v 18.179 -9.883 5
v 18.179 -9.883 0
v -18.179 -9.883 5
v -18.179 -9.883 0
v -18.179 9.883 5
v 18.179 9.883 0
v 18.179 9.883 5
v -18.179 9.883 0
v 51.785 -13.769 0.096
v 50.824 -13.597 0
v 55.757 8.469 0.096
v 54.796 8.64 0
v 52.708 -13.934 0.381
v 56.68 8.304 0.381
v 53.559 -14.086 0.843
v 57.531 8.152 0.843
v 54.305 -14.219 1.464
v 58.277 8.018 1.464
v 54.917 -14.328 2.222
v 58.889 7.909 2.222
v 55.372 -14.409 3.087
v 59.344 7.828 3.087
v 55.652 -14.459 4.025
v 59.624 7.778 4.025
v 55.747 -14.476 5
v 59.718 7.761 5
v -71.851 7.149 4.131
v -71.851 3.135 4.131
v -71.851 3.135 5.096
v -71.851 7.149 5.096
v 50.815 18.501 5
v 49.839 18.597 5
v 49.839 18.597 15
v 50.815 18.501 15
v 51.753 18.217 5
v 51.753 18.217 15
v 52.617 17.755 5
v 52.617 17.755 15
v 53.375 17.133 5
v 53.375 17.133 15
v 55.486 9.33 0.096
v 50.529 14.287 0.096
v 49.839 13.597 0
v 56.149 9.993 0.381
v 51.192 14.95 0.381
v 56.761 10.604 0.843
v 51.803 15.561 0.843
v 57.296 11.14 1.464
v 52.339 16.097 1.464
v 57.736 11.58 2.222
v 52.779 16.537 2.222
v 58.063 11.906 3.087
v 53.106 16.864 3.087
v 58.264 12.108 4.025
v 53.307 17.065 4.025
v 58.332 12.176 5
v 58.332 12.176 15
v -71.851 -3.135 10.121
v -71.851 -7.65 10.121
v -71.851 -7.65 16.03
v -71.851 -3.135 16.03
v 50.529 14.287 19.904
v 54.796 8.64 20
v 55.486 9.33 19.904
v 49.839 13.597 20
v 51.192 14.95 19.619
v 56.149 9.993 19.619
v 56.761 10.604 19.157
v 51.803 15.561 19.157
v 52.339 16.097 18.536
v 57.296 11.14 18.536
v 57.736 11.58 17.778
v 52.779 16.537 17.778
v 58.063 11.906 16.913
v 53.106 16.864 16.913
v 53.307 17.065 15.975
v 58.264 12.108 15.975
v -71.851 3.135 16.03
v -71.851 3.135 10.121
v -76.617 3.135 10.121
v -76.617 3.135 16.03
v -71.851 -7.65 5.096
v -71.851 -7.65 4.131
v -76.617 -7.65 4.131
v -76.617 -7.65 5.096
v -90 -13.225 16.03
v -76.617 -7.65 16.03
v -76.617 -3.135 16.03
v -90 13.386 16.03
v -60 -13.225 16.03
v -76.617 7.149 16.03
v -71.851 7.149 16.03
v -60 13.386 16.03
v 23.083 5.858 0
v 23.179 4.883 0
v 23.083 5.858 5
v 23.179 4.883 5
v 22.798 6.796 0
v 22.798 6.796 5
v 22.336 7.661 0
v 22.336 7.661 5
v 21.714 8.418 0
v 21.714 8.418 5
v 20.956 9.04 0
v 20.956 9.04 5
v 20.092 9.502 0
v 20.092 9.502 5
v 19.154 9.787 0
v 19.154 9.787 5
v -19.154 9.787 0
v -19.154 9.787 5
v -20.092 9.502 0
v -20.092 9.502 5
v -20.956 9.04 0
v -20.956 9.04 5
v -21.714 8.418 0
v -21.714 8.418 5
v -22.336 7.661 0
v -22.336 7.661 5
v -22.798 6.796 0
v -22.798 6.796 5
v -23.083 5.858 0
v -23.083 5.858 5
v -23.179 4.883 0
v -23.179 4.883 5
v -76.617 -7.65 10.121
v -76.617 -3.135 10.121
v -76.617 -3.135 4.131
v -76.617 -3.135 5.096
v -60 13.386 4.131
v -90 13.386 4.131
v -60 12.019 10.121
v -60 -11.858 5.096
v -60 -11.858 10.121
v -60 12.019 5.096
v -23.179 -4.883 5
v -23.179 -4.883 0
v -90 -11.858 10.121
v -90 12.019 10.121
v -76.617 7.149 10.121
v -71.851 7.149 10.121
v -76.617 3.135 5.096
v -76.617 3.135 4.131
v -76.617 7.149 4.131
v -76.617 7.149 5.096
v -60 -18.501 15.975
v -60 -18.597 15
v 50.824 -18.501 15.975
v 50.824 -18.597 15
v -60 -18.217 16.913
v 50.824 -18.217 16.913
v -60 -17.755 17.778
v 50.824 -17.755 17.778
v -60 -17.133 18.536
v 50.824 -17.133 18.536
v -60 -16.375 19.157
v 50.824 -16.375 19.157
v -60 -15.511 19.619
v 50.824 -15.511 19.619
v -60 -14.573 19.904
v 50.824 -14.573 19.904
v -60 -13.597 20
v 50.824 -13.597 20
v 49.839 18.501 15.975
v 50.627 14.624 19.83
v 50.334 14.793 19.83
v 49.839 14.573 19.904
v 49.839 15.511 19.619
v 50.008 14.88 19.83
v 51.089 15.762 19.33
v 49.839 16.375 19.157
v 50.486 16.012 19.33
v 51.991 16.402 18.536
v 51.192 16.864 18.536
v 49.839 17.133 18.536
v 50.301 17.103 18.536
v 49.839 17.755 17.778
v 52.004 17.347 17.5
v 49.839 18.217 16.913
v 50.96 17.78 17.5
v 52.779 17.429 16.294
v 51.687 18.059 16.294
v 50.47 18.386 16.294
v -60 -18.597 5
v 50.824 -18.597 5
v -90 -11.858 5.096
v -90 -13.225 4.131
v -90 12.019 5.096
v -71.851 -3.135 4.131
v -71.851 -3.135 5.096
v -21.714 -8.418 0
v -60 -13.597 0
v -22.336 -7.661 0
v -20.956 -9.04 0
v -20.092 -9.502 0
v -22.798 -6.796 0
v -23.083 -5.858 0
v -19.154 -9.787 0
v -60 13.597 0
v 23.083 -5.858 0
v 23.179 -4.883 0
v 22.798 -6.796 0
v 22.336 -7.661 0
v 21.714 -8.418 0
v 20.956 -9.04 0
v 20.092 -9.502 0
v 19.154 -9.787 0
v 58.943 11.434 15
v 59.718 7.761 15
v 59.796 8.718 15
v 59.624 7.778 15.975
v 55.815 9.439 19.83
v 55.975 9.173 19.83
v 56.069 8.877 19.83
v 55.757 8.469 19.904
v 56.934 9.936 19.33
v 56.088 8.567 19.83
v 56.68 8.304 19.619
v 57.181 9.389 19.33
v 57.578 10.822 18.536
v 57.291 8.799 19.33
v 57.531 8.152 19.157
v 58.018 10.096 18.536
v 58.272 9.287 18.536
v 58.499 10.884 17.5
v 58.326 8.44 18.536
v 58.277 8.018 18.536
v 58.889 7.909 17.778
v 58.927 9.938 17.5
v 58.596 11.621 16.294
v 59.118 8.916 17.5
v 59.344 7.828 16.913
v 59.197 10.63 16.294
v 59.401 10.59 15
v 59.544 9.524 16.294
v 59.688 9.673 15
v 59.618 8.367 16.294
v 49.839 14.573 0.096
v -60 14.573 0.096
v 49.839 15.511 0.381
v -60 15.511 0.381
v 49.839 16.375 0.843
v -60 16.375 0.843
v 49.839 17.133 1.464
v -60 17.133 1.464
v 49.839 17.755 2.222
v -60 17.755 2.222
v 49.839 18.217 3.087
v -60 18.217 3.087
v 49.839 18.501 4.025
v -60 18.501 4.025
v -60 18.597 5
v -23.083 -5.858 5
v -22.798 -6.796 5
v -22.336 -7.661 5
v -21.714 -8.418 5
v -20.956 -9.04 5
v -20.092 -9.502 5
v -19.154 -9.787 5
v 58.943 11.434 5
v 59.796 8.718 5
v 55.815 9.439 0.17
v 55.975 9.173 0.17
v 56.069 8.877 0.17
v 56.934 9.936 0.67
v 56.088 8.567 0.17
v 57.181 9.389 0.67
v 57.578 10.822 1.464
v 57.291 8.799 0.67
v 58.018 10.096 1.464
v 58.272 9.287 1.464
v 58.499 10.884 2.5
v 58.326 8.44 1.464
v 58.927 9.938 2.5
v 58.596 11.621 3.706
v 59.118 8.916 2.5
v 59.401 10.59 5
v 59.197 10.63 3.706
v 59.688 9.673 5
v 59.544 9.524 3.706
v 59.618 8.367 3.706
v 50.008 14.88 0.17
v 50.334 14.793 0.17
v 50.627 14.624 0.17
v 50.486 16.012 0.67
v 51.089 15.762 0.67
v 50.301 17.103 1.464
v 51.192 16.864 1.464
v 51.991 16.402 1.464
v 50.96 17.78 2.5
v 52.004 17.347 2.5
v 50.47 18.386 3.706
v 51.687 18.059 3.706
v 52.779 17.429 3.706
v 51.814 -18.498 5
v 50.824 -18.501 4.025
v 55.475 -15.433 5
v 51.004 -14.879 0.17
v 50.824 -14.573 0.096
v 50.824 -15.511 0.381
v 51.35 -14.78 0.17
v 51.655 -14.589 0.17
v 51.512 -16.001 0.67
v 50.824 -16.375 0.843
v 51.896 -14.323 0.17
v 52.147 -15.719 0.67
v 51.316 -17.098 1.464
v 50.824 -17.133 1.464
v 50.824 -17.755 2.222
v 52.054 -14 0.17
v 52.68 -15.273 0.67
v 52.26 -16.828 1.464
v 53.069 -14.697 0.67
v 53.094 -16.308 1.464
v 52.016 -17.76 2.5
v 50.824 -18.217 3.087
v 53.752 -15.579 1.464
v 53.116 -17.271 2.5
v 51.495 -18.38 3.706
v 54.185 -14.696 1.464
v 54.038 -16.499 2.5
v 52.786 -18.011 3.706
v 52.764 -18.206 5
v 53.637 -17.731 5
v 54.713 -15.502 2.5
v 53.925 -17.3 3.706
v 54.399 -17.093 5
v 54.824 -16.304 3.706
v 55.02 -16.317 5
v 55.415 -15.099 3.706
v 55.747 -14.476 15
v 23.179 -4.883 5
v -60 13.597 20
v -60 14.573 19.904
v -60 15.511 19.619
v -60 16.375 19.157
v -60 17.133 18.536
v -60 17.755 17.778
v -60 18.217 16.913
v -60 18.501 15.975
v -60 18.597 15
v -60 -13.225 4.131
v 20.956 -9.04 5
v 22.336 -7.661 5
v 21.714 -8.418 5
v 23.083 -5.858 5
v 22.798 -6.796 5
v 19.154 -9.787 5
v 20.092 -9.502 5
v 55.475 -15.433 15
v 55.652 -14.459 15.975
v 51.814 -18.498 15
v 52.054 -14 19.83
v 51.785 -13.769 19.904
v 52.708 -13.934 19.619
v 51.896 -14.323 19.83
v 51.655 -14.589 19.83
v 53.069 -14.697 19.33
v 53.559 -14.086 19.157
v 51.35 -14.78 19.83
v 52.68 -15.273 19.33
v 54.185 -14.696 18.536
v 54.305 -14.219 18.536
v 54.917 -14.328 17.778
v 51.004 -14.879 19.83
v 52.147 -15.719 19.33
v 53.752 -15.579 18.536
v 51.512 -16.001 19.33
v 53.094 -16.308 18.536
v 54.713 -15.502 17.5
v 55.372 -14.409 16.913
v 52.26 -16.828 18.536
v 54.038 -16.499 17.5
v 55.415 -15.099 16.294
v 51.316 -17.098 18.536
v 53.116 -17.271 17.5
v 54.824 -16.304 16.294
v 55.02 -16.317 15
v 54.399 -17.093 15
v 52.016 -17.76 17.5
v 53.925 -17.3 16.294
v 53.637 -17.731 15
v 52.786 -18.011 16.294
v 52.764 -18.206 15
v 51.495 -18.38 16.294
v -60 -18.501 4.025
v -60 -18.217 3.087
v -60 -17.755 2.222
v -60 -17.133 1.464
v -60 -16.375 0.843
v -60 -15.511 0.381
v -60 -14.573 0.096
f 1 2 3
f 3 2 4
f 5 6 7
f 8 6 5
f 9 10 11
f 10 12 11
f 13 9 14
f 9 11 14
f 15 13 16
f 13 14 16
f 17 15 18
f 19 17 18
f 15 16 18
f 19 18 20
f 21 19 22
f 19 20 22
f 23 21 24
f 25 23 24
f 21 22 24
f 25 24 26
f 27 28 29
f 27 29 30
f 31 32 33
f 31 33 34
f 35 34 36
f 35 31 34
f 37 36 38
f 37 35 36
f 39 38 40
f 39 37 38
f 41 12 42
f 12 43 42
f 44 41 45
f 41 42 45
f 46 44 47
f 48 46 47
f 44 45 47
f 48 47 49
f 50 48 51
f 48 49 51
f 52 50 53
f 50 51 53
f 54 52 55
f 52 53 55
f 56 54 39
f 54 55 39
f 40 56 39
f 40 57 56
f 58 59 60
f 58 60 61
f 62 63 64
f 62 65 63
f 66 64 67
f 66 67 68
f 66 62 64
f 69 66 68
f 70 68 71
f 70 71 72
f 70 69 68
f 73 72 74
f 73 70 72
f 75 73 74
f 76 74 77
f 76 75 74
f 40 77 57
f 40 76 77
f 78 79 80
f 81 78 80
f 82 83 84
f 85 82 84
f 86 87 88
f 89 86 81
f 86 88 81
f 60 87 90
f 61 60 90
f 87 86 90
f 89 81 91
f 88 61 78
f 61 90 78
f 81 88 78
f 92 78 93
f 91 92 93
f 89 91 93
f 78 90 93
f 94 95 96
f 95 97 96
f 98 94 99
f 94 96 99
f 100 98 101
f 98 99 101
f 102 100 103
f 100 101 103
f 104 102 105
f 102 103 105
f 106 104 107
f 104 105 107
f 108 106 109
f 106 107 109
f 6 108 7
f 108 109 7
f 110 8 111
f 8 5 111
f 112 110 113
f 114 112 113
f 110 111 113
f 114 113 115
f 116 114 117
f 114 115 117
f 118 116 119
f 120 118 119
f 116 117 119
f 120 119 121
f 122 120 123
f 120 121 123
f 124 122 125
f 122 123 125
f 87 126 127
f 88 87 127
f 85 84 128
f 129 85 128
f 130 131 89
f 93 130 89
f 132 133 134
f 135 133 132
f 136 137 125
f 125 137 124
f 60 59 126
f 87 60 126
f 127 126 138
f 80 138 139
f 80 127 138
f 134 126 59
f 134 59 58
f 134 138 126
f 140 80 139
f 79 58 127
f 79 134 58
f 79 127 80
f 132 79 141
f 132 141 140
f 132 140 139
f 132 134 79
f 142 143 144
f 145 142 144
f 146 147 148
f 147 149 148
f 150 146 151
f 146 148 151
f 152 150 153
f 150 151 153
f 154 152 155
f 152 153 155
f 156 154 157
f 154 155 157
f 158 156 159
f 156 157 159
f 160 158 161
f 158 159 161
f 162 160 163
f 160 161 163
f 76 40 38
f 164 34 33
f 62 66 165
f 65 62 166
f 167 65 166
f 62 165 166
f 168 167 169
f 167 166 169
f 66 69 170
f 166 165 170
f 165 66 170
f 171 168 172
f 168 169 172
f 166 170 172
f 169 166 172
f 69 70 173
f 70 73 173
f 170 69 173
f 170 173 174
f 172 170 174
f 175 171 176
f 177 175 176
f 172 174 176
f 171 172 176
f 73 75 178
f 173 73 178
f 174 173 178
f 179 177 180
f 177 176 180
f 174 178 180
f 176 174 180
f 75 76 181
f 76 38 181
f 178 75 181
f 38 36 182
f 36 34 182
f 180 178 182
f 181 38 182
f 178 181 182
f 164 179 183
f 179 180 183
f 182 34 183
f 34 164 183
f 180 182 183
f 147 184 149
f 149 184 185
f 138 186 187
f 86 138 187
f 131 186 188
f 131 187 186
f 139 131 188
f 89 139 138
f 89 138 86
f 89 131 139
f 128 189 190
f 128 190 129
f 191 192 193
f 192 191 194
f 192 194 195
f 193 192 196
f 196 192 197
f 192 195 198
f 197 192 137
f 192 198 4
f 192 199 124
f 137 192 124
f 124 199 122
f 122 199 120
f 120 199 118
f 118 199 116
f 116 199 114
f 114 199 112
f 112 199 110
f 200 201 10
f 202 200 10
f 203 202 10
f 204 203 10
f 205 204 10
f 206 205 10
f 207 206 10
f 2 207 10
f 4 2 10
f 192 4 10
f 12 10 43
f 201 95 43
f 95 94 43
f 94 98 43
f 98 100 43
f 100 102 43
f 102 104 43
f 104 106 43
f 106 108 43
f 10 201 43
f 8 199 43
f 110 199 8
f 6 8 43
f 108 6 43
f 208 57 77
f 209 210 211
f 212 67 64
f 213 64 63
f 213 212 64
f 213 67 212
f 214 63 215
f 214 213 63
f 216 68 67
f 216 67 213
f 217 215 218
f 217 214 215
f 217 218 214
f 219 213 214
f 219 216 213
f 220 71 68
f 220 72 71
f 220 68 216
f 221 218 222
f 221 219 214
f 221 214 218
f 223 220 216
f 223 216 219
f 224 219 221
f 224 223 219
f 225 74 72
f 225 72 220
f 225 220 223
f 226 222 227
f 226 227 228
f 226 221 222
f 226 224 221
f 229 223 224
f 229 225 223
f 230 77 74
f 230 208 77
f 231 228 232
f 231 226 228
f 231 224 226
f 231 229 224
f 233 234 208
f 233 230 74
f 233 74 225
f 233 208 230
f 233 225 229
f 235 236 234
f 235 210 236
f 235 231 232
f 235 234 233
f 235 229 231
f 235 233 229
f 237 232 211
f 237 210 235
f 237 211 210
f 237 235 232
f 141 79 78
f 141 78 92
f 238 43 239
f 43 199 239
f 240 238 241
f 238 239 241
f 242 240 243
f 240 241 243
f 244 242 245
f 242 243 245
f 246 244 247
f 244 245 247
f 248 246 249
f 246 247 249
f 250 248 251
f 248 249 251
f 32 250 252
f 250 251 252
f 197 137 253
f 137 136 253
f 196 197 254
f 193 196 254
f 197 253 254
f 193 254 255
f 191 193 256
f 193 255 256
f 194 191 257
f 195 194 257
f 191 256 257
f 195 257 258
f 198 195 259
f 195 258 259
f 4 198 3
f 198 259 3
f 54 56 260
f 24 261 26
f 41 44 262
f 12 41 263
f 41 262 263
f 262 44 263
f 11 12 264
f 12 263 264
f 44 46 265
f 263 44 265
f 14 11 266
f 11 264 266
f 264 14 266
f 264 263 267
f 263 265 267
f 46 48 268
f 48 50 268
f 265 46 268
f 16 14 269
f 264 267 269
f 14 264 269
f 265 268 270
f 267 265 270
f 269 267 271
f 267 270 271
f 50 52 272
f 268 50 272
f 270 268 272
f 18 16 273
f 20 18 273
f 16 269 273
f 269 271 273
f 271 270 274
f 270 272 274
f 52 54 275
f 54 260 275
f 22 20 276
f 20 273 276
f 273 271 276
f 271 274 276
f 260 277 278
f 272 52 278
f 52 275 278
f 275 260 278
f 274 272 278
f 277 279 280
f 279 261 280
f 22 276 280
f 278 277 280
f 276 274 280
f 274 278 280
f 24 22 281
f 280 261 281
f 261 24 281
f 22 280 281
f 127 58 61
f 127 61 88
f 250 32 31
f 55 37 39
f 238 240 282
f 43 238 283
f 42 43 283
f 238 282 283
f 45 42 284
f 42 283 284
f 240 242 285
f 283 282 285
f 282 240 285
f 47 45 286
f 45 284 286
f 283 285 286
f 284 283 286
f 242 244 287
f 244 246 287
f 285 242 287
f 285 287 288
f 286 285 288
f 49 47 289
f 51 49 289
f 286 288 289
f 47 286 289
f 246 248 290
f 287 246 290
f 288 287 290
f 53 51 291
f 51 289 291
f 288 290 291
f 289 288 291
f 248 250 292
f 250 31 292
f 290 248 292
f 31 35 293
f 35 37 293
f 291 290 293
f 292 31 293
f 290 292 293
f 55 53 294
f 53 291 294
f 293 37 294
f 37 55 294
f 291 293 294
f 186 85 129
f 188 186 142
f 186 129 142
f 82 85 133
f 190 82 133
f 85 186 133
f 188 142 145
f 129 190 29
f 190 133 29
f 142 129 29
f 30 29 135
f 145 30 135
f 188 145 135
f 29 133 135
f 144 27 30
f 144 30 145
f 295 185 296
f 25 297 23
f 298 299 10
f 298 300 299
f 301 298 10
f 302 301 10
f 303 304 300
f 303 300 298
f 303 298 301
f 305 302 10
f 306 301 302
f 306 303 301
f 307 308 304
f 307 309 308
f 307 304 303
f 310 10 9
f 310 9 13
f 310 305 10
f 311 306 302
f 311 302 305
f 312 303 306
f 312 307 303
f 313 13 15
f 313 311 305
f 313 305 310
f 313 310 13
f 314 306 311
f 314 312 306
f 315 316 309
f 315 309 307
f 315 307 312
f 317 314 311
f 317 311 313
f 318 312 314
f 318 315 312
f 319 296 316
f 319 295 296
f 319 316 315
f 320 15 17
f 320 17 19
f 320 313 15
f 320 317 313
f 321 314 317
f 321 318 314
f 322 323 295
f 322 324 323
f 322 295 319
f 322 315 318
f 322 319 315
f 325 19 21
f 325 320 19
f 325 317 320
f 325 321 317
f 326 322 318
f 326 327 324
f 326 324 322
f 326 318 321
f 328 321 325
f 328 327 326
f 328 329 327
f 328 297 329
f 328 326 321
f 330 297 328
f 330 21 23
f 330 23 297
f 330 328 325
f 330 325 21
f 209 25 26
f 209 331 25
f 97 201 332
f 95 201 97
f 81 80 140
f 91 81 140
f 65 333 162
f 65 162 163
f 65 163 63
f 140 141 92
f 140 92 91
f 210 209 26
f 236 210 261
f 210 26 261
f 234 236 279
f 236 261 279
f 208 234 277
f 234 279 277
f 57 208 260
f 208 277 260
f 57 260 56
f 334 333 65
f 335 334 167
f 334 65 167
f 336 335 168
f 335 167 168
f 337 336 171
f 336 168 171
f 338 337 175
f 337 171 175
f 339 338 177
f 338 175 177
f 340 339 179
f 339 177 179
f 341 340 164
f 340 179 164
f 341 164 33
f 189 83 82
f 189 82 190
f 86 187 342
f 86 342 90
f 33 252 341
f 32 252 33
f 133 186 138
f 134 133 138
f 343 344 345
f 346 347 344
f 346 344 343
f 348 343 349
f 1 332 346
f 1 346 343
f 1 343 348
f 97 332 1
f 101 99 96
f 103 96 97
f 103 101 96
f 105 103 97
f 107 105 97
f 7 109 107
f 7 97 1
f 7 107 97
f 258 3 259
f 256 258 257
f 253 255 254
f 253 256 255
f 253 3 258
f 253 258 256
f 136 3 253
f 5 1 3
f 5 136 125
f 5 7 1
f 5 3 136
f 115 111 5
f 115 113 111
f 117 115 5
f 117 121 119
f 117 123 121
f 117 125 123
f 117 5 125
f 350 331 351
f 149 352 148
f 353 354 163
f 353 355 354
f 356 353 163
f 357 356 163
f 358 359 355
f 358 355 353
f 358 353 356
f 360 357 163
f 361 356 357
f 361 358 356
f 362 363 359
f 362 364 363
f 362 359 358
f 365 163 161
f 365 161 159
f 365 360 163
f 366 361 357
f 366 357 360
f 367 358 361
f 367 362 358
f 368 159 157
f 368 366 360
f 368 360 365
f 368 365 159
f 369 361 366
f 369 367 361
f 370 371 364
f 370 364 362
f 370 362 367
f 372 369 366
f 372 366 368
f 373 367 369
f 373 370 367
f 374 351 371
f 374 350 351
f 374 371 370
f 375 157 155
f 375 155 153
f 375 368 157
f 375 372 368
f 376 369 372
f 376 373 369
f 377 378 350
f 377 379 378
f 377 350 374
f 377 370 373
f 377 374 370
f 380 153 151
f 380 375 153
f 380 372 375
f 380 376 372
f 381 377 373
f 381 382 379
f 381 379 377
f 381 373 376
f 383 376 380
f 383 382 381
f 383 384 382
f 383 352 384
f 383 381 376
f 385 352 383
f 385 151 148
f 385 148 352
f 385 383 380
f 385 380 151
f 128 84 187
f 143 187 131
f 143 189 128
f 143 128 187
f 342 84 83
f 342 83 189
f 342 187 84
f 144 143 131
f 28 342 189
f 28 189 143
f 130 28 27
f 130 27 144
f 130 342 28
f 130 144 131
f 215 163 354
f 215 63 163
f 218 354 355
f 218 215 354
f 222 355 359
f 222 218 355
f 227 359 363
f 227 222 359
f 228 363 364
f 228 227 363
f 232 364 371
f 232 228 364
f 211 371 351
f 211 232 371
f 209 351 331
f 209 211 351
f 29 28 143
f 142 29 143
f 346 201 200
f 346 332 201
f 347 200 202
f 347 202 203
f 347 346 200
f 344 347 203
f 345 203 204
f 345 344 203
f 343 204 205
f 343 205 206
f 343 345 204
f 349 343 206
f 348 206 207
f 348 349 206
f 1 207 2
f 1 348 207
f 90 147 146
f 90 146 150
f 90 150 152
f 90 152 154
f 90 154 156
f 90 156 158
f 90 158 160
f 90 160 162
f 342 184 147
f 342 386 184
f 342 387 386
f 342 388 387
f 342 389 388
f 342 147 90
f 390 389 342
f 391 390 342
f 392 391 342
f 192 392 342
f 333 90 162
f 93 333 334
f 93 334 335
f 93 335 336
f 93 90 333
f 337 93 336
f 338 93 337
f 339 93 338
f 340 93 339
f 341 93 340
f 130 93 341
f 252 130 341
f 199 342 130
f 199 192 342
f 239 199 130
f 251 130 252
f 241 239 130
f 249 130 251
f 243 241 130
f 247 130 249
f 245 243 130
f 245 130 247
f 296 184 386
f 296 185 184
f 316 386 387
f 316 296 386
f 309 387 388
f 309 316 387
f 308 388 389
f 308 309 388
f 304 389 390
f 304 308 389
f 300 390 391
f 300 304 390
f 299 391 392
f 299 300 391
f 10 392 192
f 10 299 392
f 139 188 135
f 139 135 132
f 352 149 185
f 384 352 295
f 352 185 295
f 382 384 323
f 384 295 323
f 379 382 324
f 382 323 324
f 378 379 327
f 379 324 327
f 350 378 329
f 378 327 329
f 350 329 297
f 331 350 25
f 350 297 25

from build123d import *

# Parameters (mm, degrees)
SKETCH1_W           = 120
SKETCH1_H           = 37.194444444
BOSS_EXTRUDE4_DEPTH = 20
CUT_EXTRUDE15_DEPTH = 23
SKETCH10_W          = 11.898671916
SKETCH10_H          = 26.611218947
SKETCH10_W_2        = 10.049553983
SKETCH10_H_2        = 23.877740264
BOSS_EXTRUDE5_DEPTH = 30
SKETCH11_W          = 5.024776991
SKETCH11_H          = 23.877740264
BOSS_EXTRUDE6_DEPTH = 30
SKETCH12_W          = 4.765877192
SKETCH12_H          = 4.013370267
SKETCH12_H_2        = 4.515041551
CUT_EXTRUDE16_DEPTH = 16.868939526
FILLET2_R           = 5
SKETCH16_W          = 46.35727902
SKETCH16_H          = 19.765742142
CUT_EXTRUDE17_DEPTH = 5
FILLET3_R           = 5


with BuildPart() as part:
    # Sketch1 → Boss-Extrude4 (new body)
    with BuildSketch(Plane.XY):
        Polygon((36.833333333, 25.458333333), (36.833333333, 18.597222222), (60, 18.597222222), (60, -18.597222222), (68.25, -18.597222222), (72.583333333, 25.458333333), align=None)
        Rectangle(SKETCH1_W, SKETCH1_H)
    extrude(amount=BOSS_EXTRUDE4_DEPTH)

    # Sketch6 → Cut-Extrude15 (cut)
    with BuildSketch(Plane.XY.offset(20)):
        Polygon((51.910176302, 18.597222222), (36.833333333, 18.597222222), (36.833333333, 25.458333333), (72.583333333, 25.458333333), (68.25, -18.597222222), (55.010463364, -18.597222222), (60.177305366, 10.330093158), align=None)
    extrude(amount=-CUT_EXTRUDE15_DEPTH, mode=Mode.SUBTRACT)

    # Sketch10 → Boss-Extrude5 (add)
    with BuildSketch(Plane.ZY.offset(60)):
        with Locations((10.080396432, 0.080396432)):
            Rectangle(SKETCH10_W, SKETCH10_H)
        with Locations((10.120594648, 0.080396432)):
            Rectangle(SKETCH10_W_2, SKETCH10_H_2, mode=Mode.SUBTRACT)
    extrude(amount=BOSS_EXTRUDE5_DEPTH)

    # Sketch11 → Boss-Extrude6 (add)
    with BuildSketch(Plane.ZY.offset(60)):
        with Locations((12.632983144, 0.080396432)):
            Rectangle(SKETCH11_W, SKETCH11_H)
    extrude(amount=BOSS_EXTRUDE6_DEPTH)

    # Sketch12 → Cut-Extrude16 (cut, through all)
    with BuildSketch(Plane(origin=(0, 0, 4.131060474), x_dir=(-1, 0, 0), z_dir=(0, 0, -1))):
        with Locations((74.233976577, 5.142130655)):
            Rectangle(SKETCH12_W, SKETCH12_H)
        with Locations((74.233976577, -5.392966297)):
            Rectangle(SKETCH12_W, SKETCH12_H_2)
    extrude(amount=-CUT_EXTRUDE16_DEPTH, mode=Mode.SUBTRACT)

    # Fillet2
    fillet2_edges = [part.edges().sort_by_distance(p)[0] for p in [
        (-2.494768318, -18.597222222, 0),
        (56.043740834, 14.46365769, 0),
        (57.593884365, -4.133564532, 0),
        (-4.044911849, 18.597222222, 20),
        (-2.494768318, -18.597222222, 20),
        (55.010463364, -18.597222222, 10),
        (60.177305366, 10.330093158, 10),
        (51.910176302, 18.597222222, 10),
        (56.043740834, 14.46365769, 20),
        (57.593884365, -4.133564532, 20),
        (-4.044911849, 18.597222222, 0),
    ]]
    fillet(fillet2_edges, radius=FILLET2_R)

    # Sketch16 → Cut-Extrude17 (cut)
    with BuildSketch(Plane(origin=(0, 0, 0), x_dir=(-1, 0, 0), z_dir=(0, 0, -1))):
        Rectangle(SKETCH16_W, SKETCH16_H)
    extrude(amount=-CUT_EXTRUDE17_DEPTH, mode=Mode.SUBTRACT)

    # Fillet3
    fillet3_edges = [part.edges().sort_by_distance(p)[0] for p in [
        (23.17863951, -9.882871071, 2.5),
        (23.17863951, 9.882871071, 2.5),
        (-23.17863951, 9.882871071, 2.5),
        (-23.17863951, -9.882871071, 2.5),
    ]]
    fillet(fillet3_edges, radius=FILLET3_R)


solid = part.part
